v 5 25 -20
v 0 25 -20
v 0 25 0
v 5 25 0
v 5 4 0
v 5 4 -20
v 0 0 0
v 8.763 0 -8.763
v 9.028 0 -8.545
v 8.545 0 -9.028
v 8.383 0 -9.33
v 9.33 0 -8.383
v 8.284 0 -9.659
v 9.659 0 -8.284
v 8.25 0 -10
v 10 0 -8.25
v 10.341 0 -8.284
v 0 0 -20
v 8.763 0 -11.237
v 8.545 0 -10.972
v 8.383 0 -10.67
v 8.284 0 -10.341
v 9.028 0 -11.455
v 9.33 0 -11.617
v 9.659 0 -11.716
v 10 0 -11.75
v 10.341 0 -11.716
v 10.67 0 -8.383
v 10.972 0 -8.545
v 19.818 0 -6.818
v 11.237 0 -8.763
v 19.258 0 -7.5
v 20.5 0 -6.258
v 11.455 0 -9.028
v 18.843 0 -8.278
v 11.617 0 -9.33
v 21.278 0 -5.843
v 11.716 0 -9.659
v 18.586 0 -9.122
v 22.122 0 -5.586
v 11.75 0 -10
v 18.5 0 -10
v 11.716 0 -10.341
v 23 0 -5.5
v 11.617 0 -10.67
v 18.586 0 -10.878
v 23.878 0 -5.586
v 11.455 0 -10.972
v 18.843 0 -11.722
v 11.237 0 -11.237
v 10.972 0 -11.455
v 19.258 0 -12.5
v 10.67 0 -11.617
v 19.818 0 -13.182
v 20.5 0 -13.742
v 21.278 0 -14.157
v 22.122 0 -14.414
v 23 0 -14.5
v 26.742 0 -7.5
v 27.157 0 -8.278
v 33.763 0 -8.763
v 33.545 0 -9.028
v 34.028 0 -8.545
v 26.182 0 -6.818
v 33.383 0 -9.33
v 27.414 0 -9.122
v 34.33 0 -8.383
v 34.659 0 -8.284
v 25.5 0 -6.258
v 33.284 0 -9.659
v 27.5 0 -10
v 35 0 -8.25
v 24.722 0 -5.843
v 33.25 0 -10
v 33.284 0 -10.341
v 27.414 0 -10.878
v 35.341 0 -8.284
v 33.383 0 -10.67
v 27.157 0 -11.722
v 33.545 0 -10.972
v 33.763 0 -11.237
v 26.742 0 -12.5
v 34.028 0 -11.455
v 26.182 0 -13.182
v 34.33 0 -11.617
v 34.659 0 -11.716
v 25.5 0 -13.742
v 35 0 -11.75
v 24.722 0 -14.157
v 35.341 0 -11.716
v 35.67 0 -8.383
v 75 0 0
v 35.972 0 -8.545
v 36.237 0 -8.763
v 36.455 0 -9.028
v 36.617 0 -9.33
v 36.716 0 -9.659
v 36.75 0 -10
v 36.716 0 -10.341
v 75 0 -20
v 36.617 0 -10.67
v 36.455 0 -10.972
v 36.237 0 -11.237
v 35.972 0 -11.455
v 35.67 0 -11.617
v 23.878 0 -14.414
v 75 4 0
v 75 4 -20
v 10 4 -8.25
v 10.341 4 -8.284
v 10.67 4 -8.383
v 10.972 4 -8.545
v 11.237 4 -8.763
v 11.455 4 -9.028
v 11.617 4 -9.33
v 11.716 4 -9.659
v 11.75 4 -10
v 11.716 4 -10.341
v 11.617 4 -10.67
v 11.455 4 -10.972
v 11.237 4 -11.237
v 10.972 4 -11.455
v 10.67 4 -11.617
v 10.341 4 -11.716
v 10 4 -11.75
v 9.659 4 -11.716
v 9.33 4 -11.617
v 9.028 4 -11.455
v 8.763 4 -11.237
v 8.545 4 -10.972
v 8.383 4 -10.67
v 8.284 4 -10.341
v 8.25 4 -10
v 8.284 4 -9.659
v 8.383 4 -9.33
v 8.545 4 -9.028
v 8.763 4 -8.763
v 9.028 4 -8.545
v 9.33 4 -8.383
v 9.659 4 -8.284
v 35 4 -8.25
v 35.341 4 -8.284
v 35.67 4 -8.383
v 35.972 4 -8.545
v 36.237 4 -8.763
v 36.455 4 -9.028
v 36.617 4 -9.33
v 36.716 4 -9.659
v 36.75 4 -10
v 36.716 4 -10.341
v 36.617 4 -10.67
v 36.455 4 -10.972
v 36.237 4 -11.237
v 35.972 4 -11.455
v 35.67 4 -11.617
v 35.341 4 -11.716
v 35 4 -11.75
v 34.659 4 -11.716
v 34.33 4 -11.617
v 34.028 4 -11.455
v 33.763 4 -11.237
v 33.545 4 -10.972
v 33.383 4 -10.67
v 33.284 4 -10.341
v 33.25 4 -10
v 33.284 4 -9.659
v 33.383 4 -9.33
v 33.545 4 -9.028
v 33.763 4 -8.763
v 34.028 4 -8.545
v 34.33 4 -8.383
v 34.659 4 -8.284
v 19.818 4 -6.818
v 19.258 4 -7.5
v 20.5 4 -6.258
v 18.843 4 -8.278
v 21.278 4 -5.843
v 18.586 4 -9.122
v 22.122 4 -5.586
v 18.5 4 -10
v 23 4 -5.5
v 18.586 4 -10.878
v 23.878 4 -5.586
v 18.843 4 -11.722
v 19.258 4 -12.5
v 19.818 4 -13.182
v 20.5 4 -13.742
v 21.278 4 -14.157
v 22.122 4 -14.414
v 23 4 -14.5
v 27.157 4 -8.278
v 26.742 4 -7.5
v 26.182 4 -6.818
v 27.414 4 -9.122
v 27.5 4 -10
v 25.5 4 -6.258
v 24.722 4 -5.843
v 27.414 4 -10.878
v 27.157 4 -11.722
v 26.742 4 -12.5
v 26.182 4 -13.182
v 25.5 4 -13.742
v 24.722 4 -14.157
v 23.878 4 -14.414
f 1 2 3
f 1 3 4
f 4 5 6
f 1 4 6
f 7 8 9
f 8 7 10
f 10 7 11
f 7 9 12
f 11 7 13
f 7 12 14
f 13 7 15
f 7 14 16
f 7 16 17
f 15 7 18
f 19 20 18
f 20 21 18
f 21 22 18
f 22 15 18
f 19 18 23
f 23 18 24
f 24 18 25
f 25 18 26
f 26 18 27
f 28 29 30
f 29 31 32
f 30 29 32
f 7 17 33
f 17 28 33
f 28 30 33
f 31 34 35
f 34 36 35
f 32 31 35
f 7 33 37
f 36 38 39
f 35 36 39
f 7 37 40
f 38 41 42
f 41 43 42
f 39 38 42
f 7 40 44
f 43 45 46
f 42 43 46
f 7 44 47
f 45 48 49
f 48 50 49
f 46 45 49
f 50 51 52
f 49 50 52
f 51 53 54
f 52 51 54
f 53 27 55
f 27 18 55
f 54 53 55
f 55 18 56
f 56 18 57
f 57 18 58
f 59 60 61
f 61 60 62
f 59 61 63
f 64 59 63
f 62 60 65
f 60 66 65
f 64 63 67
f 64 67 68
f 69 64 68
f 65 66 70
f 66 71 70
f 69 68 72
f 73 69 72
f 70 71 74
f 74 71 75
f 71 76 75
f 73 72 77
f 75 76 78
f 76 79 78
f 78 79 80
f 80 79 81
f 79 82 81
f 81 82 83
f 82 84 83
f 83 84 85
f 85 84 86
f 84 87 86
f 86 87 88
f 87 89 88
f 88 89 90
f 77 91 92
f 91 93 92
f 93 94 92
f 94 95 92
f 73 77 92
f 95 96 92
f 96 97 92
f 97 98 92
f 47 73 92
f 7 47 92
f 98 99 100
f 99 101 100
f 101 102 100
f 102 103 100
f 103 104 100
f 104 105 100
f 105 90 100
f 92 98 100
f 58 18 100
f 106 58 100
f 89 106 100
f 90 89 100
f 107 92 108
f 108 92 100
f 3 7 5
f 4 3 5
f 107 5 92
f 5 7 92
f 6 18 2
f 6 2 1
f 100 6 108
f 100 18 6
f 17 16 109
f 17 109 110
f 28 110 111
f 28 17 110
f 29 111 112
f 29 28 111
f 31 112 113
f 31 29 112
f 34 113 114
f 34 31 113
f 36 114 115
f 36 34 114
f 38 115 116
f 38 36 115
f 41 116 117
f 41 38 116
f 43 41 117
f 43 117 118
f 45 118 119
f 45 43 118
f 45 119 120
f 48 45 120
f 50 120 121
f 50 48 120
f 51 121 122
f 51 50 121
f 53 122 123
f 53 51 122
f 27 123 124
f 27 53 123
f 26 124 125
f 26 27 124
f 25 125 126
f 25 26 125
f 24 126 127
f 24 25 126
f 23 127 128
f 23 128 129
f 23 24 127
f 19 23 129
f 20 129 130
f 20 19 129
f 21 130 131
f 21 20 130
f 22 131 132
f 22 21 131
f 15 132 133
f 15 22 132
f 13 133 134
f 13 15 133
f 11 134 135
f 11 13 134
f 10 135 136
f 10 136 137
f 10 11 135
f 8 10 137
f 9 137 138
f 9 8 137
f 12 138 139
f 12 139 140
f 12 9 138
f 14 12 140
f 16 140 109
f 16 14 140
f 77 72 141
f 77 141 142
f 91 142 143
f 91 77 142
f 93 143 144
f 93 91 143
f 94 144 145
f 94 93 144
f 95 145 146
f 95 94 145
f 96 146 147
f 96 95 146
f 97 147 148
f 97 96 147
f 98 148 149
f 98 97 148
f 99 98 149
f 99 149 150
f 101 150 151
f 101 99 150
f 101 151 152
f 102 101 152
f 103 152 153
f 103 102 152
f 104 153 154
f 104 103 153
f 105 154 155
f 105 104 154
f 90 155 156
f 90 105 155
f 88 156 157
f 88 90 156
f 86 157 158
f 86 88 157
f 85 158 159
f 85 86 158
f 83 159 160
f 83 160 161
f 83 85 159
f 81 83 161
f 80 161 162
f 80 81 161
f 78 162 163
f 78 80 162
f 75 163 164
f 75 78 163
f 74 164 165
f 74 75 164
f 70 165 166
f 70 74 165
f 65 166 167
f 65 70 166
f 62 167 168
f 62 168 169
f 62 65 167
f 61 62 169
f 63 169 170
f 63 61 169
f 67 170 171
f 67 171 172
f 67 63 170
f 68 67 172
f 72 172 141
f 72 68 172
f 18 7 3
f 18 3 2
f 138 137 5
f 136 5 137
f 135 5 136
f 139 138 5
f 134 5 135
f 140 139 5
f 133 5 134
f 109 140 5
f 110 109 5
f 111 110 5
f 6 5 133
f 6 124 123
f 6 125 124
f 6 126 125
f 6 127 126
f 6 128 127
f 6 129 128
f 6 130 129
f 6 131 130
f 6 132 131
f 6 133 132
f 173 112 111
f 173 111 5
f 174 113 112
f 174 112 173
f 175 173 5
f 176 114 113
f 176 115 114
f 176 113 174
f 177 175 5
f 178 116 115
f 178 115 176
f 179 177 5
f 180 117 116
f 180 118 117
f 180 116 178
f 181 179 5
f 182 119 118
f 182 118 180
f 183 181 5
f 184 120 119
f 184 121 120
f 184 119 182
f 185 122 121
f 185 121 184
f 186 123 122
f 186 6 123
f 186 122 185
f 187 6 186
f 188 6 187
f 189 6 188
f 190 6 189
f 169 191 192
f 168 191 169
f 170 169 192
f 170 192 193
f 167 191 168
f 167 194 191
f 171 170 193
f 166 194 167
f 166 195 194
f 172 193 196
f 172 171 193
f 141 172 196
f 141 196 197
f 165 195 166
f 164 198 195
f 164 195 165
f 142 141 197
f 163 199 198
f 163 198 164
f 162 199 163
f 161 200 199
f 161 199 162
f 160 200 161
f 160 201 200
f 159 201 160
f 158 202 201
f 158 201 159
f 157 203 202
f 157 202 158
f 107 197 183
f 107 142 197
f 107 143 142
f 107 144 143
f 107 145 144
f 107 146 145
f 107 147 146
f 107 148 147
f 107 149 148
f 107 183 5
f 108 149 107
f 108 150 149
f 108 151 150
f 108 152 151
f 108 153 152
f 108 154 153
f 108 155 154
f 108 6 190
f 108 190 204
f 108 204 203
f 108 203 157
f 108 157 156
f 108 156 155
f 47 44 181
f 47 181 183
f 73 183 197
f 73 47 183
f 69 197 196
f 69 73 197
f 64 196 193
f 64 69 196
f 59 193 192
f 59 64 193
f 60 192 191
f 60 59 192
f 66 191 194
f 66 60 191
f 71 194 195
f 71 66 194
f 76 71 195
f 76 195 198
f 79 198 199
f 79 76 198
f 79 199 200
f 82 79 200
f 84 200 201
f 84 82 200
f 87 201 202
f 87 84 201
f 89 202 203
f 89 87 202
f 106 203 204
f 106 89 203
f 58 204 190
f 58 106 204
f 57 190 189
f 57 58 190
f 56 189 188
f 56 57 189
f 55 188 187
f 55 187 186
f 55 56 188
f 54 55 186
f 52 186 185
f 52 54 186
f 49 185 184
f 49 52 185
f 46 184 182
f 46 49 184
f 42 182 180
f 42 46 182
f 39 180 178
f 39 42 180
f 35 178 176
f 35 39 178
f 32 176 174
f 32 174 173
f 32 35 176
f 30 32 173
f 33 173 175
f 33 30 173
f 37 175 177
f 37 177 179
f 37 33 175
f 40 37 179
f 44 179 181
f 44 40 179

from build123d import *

# Parameters (mm, degrees)
SKETCH_1_W      = 70
SKETCH_1_H      = 20
SKETCH_1_R      = 1.75
SKETCH_1_R_2    = 4.5
EXTRUDE_1_DEPTH = 4
SKETCH_1_3_W    = 5
SKETCH_1_3_H    = 20
EXTRUDE_2_DEPTH = 25


with BuildPart() as part:
    # 草图1 → 凸台-拉伸1 (new body)
    with BuildSketch(Plane(origin=(0, 0, 0), x_dir=(1, 0, 0), z_dir=(0, 1, 0))):
        with Locations((40, 10)):
            Rectangle(SKETCH_1_W, SKETCH_1_H)
        with Locations((10, 10)):
            Circle(SKETCH_1_R, mode=Mode.SUBTRACT)
        with Locations((23, 10)):
            Circle(SKETCH_1_R_2, mode=Mode.SUBTRACT)
        with Locations((35, 10)):
            Circle(SKETCH_1_R, mode=Mode.SUBTRACT)
    extrude(amount=EXTRUDE_1_DEPTH)

    # 草图1<3> → 凸台-拉伸2 (add)
    with BuildSketch(Plane(origin=(0, 0, 0), x_dir=(1, 0, 0), z_dir=(0, 1, 0))):
        with Locations((2.5, 10)):
            Rectangle(SKETCH_1_3_W, SKETCH_1_3_H)
    extrude(amount=EXTRUDE_2_DEPTH)


solid = part.part
